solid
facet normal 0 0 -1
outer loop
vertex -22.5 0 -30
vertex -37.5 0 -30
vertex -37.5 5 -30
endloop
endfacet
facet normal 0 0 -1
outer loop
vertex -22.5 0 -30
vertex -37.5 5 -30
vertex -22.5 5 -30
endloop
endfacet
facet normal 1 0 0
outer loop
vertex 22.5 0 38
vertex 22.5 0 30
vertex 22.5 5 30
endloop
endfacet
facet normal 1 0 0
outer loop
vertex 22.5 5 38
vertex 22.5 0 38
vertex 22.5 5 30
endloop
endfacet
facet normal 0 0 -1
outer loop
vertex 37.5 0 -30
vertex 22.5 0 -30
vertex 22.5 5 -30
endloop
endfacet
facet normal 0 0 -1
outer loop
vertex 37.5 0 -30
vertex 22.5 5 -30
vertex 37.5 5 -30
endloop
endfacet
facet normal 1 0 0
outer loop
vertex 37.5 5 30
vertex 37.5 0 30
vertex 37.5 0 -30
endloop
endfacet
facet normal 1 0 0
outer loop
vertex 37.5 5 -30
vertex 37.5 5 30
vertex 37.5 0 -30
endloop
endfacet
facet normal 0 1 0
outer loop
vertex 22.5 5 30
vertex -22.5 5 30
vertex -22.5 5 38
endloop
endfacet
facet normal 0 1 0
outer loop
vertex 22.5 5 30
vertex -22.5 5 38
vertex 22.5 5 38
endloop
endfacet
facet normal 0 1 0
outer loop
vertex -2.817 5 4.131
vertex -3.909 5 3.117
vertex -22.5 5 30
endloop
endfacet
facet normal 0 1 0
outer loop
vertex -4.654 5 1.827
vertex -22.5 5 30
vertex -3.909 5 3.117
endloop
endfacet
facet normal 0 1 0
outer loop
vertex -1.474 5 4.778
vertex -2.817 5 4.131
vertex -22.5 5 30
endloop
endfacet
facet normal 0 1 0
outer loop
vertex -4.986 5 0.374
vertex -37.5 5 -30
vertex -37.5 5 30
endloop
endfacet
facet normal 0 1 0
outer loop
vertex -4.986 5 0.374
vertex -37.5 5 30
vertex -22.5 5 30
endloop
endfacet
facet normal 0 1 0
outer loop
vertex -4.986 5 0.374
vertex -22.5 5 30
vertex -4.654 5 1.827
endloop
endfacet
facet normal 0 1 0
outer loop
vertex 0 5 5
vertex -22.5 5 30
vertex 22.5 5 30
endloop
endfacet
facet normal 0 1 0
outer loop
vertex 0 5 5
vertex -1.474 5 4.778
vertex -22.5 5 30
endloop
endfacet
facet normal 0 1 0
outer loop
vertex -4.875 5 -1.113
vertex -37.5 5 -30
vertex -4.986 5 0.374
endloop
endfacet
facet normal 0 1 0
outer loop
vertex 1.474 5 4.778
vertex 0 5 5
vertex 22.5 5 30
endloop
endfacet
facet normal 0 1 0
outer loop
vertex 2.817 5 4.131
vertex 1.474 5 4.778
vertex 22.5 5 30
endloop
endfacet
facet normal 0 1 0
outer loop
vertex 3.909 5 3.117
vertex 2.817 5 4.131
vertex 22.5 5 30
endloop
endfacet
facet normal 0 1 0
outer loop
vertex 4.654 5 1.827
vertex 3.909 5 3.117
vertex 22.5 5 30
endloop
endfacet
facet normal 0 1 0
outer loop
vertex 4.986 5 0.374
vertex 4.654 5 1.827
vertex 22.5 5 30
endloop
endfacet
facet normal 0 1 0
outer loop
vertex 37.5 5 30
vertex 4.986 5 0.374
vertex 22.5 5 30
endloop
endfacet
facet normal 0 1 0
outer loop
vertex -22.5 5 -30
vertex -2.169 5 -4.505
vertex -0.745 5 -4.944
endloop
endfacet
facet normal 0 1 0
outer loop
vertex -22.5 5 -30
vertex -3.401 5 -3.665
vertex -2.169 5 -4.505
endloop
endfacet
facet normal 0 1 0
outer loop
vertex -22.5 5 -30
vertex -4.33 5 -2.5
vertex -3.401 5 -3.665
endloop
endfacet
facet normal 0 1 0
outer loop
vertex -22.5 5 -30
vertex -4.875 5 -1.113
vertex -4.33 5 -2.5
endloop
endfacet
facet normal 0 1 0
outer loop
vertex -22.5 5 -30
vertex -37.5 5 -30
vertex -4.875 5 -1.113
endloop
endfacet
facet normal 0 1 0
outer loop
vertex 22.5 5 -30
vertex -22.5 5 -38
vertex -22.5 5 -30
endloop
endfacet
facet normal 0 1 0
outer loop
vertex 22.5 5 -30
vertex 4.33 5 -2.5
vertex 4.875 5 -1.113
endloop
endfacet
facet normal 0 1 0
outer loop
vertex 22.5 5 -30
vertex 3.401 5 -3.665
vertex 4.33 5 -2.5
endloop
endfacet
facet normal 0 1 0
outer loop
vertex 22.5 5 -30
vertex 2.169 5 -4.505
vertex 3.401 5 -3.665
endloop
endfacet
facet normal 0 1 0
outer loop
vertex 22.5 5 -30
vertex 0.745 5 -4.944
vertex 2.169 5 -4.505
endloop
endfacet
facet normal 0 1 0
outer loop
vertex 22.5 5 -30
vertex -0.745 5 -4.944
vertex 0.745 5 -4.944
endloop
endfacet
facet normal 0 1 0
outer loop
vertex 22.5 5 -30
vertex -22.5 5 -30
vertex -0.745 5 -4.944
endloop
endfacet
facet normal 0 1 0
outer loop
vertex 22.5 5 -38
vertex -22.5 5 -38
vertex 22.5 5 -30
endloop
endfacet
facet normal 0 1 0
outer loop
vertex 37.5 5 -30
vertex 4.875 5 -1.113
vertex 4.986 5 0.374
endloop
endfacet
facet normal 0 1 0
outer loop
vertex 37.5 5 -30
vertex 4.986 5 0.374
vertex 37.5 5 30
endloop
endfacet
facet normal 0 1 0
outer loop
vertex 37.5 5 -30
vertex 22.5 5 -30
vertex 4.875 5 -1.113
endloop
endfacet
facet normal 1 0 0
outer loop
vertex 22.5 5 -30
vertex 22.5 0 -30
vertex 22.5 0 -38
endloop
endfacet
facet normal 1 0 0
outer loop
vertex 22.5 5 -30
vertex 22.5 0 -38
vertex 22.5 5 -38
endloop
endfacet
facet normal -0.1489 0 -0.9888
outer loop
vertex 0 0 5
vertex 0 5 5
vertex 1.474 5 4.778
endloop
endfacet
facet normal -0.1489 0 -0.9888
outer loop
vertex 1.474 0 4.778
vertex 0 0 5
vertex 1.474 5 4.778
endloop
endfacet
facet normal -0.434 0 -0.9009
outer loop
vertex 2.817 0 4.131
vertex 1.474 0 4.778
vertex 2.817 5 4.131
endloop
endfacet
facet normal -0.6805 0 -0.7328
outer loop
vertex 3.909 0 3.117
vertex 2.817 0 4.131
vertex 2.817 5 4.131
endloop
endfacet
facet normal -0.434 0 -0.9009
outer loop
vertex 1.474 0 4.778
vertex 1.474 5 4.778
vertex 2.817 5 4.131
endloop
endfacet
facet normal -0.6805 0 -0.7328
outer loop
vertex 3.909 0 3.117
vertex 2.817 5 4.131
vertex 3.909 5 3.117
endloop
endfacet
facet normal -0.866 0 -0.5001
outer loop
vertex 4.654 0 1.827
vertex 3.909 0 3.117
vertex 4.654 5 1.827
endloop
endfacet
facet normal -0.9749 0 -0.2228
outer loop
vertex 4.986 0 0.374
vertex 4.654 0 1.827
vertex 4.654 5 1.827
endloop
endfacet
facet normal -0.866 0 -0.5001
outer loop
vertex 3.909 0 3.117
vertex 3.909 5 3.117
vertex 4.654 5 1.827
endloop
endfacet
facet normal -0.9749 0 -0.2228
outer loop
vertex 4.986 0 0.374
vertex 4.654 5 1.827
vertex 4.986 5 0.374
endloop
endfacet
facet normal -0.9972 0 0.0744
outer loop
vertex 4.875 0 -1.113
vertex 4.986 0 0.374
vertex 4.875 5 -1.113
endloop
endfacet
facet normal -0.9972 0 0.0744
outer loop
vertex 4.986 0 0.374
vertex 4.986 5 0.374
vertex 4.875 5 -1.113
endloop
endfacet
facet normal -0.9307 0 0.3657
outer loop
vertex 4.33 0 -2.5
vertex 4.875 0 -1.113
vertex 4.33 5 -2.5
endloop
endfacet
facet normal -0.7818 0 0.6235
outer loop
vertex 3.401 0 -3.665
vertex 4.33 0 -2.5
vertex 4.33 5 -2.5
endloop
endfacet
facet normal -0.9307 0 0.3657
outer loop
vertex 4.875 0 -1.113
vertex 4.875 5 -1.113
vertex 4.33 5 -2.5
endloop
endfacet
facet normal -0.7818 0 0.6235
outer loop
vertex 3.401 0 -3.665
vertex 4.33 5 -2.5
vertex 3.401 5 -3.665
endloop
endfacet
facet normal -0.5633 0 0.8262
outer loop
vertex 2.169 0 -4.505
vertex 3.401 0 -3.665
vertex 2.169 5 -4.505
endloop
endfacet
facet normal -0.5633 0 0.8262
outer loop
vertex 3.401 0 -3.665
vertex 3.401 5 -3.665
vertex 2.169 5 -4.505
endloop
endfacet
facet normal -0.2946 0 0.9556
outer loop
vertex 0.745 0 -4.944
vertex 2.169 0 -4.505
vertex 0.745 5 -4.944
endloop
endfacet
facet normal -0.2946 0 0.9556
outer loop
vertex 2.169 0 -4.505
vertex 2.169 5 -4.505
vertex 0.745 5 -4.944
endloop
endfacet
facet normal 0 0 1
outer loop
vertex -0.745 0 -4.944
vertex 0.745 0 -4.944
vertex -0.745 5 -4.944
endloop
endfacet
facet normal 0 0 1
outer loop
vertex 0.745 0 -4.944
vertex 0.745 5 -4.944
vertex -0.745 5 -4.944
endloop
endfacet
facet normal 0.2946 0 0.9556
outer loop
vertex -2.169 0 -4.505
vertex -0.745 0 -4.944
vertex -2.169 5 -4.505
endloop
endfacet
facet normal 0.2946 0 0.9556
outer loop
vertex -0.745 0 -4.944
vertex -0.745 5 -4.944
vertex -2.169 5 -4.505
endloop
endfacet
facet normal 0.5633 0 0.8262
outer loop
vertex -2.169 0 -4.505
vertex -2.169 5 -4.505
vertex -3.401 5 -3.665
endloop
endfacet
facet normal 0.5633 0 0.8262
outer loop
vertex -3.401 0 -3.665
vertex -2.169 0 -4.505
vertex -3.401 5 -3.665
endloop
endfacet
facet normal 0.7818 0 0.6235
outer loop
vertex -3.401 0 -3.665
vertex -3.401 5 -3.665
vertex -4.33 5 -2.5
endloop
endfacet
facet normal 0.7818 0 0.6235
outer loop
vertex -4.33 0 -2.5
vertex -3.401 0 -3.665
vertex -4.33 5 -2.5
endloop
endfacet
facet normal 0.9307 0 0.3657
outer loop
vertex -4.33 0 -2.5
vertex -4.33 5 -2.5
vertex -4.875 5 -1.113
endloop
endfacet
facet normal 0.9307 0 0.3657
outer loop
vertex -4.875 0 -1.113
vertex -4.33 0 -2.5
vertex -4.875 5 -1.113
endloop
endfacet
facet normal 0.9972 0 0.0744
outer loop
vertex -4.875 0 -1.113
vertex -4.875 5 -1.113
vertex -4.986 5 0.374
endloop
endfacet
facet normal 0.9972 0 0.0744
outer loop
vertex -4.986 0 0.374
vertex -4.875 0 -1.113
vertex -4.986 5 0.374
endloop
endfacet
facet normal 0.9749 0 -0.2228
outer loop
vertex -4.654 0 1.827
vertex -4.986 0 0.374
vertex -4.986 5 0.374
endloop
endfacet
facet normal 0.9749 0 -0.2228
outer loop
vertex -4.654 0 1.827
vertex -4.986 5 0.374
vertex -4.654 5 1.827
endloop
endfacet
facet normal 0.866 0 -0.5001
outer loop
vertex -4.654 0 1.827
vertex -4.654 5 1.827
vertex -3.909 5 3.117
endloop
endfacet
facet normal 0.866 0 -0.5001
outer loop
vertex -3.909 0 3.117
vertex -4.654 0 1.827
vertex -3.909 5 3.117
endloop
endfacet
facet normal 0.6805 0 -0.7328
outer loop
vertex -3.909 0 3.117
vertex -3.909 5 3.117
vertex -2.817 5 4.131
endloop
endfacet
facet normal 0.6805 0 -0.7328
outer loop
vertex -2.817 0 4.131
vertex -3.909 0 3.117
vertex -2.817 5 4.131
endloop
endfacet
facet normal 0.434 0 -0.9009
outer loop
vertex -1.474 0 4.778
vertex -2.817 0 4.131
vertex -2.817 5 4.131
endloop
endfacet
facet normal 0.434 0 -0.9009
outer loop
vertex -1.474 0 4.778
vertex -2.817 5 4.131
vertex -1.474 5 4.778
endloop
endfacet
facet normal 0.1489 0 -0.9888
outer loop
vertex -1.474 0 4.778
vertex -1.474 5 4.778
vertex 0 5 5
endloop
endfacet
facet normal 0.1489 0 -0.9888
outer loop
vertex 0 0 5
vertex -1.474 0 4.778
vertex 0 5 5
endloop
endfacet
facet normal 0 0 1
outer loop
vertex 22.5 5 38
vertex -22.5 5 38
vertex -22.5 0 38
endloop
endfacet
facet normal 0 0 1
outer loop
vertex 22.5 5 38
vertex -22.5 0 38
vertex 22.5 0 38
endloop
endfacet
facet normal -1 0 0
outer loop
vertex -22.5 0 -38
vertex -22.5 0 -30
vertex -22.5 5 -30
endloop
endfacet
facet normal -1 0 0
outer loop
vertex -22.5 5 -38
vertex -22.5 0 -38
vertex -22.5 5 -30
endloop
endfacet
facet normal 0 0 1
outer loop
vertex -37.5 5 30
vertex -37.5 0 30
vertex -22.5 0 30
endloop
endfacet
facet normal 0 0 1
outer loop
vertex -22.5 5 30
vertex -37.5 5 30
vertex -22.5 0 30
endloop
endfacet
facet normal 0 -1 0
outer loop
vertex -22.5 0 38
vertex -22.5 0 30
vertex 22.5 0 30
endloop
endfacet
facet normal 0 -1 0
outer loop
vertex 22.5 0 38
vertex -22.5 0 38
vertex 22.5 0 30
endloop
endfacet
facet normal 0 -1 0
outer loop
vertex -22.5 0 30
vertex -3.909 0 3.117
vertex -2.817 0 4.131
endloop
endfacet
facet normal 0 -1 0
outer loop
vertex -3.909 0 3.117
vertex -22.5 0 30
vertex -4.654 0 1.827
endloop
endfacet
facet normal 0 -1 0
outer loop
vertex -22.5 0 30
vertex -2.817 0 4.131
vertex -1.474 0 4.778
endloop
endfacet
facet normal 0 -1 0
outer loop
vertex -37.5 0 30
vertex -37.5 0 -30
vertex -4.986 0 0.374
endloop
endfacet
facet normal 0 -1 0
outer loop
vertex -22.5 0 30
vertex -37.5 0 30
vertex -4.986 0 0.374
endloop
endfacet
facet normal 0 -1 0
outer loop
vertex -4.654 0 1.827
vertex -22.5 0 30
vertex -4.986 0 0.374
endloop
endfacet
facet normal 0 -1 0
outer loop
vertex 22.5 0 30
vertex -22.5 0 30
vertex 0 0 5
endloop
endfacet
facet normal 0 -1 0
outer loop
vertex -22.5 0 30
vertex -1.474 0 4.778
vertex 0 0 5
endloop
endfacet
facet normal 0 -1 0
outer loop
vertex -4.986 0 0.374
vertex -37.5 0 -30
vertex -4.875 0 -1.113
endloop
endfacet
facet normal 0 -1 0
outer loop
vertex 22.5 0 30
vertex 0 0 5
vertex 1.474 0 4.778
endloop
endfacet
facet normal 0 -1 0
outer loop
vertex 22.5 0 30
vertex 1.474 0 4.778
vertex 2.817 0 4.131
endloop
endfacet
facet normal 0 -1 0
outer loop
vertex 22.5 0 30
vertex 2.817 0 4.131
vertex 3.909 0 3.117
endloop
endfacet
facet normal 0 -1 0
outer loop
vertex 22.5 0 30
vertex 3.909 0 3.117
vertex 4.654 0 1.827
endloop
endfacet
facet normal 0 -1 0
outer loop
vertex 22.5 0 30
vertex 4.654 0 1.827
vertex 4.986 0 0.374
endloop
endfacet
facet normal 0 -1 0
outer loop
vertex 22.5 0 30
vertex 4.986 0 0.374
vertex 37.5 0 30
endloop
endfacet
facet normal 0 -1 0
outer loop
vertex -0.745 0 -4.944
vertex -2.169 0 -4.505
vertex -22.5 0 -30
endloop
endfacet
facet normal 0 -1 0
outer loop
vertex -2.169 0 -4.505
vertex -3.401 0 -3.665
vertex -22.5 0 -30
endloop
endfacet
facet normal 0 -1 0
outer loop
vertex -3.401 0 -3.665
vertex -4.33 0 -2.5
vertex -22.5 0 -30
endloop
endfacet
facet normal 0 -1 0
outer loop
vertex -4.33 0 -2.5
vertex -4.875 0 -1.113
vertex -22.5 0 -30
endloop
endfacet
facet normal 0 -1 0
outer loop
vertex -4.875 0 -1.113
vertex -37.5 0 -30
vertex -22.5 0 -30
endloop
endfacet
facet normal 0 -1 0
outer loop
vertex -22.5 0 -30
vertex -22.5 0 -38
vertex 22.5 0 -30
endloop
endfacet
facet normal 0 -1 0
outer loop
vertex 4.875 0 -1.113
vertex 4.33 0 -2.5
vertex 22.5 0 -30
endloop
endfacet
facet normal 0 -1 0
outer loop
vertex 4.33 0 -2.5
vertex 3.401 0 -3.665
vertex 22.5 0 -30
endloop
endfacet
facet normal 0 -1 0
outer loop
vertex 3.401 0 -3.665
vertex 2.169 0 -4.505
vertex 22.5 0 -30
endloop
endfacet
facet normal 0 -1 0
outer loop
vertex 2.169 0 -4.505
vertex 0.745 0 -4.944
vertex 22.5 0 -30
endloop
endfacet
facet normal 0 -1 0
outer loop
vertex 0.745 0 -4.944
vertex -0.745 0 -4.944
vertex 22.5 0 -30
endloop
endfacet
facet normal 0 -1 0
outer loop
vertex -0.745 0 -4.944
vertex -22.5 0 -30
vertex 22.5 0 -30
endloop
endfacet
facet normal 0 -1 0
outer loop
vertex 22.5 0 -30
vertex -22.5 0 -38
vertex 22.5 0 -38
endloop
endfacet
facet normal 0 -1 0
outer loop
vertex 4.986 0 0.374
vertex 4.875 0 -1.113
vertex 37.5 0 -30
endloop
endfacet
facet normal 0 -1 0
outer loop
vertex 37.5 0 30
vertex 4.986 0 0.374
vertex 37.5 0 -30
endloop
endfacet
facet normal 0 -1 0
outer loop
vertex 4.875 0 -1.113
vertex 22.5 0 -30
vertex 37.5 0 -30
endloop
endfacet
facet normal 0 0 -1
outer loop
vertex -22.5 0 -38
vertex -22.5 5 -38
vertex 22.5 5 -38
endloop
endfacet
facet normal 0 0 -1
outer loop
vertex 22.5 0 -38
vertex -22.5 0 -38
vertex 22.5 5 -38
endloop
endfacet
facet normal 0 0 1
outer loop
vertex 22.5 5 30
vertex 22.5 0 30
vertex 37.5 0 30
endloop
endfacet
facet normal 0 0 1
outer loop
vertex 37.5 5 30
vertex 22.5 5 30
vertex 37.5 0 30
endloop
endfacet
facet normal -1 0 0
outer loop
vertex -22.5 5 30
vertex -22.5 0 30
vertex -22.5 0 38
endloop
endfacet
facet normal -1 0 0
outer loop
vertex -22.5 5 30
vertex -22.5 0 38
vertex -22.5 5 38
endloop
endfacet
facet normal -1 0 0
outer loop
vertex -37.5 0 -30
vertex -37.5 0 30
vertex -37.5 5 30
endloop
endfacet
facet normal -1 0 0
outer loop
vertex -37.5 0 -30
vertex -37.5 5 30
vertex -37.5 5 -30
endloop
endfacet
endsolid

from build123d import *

# Parameters (mm, degrees)
SCHIZZO1_W                   = 75
SCHIZZO1_H                   = 60
ESTRUSIONE_ESTRUSIONE1_DEPTH = 5
SCHIZZO2_R                   = 5
TAGLIO_ESTRUSIONE1_DEPTH     = 49.28301979
SCHIZZO3_W                   = 45
SCHIZZO3_H                   = 5
ESTRUSIONE_ESTRUSIONE2_DEPTH = 8


with BuildPart() as part:
    # Schizzo1 → Estrusione-Estrusione1 (new body)
    with BuildSketch(Plane(origin=(0, 0, 0), x_dir=(1, 0, 0), z_dir=(0, 1, 0))):
        Rectangle(SCHIZZO1_W, SCHIZZO1_H)
    extrude(amount=ESTRUSIONE_ESTRUSIONE1_DEPTH)

    # Schizzo2 → Taglio-Estrusione1 (cut, through all)
    with BuildSketch(Plane(origin=(0, 5, 0), x_dir=(-1, 0, 0), z_dir=(0, 1, 0))):
        with Locations(Location((0, 0, 0), (0, 0, 90))):
            Circle(SCHIZZO2_R)
    extrude(amount=-TAGLIO_ESTRUSIONE1_DEPTH, mode=Mode.SUBTRACT)

    # Schizzo3 → Estrusione-Estrusione2 (add)
    with BuildSketch(Plane.XY.offset(30)):
        with Locations((0, 2.5)):
            Rectangle(SCHIZZO3_W, SCHIZZO3_H)
    estrusione_estrusione2 = extrude(amount=ESTRUSIONE_ESTRUSIONE2_DEPTH)

    # Specchia1: Estrusione-Estrusione2 across plane
    add(estrusione_estrusione2.mirror(Plane.XY))


solid = part.part
